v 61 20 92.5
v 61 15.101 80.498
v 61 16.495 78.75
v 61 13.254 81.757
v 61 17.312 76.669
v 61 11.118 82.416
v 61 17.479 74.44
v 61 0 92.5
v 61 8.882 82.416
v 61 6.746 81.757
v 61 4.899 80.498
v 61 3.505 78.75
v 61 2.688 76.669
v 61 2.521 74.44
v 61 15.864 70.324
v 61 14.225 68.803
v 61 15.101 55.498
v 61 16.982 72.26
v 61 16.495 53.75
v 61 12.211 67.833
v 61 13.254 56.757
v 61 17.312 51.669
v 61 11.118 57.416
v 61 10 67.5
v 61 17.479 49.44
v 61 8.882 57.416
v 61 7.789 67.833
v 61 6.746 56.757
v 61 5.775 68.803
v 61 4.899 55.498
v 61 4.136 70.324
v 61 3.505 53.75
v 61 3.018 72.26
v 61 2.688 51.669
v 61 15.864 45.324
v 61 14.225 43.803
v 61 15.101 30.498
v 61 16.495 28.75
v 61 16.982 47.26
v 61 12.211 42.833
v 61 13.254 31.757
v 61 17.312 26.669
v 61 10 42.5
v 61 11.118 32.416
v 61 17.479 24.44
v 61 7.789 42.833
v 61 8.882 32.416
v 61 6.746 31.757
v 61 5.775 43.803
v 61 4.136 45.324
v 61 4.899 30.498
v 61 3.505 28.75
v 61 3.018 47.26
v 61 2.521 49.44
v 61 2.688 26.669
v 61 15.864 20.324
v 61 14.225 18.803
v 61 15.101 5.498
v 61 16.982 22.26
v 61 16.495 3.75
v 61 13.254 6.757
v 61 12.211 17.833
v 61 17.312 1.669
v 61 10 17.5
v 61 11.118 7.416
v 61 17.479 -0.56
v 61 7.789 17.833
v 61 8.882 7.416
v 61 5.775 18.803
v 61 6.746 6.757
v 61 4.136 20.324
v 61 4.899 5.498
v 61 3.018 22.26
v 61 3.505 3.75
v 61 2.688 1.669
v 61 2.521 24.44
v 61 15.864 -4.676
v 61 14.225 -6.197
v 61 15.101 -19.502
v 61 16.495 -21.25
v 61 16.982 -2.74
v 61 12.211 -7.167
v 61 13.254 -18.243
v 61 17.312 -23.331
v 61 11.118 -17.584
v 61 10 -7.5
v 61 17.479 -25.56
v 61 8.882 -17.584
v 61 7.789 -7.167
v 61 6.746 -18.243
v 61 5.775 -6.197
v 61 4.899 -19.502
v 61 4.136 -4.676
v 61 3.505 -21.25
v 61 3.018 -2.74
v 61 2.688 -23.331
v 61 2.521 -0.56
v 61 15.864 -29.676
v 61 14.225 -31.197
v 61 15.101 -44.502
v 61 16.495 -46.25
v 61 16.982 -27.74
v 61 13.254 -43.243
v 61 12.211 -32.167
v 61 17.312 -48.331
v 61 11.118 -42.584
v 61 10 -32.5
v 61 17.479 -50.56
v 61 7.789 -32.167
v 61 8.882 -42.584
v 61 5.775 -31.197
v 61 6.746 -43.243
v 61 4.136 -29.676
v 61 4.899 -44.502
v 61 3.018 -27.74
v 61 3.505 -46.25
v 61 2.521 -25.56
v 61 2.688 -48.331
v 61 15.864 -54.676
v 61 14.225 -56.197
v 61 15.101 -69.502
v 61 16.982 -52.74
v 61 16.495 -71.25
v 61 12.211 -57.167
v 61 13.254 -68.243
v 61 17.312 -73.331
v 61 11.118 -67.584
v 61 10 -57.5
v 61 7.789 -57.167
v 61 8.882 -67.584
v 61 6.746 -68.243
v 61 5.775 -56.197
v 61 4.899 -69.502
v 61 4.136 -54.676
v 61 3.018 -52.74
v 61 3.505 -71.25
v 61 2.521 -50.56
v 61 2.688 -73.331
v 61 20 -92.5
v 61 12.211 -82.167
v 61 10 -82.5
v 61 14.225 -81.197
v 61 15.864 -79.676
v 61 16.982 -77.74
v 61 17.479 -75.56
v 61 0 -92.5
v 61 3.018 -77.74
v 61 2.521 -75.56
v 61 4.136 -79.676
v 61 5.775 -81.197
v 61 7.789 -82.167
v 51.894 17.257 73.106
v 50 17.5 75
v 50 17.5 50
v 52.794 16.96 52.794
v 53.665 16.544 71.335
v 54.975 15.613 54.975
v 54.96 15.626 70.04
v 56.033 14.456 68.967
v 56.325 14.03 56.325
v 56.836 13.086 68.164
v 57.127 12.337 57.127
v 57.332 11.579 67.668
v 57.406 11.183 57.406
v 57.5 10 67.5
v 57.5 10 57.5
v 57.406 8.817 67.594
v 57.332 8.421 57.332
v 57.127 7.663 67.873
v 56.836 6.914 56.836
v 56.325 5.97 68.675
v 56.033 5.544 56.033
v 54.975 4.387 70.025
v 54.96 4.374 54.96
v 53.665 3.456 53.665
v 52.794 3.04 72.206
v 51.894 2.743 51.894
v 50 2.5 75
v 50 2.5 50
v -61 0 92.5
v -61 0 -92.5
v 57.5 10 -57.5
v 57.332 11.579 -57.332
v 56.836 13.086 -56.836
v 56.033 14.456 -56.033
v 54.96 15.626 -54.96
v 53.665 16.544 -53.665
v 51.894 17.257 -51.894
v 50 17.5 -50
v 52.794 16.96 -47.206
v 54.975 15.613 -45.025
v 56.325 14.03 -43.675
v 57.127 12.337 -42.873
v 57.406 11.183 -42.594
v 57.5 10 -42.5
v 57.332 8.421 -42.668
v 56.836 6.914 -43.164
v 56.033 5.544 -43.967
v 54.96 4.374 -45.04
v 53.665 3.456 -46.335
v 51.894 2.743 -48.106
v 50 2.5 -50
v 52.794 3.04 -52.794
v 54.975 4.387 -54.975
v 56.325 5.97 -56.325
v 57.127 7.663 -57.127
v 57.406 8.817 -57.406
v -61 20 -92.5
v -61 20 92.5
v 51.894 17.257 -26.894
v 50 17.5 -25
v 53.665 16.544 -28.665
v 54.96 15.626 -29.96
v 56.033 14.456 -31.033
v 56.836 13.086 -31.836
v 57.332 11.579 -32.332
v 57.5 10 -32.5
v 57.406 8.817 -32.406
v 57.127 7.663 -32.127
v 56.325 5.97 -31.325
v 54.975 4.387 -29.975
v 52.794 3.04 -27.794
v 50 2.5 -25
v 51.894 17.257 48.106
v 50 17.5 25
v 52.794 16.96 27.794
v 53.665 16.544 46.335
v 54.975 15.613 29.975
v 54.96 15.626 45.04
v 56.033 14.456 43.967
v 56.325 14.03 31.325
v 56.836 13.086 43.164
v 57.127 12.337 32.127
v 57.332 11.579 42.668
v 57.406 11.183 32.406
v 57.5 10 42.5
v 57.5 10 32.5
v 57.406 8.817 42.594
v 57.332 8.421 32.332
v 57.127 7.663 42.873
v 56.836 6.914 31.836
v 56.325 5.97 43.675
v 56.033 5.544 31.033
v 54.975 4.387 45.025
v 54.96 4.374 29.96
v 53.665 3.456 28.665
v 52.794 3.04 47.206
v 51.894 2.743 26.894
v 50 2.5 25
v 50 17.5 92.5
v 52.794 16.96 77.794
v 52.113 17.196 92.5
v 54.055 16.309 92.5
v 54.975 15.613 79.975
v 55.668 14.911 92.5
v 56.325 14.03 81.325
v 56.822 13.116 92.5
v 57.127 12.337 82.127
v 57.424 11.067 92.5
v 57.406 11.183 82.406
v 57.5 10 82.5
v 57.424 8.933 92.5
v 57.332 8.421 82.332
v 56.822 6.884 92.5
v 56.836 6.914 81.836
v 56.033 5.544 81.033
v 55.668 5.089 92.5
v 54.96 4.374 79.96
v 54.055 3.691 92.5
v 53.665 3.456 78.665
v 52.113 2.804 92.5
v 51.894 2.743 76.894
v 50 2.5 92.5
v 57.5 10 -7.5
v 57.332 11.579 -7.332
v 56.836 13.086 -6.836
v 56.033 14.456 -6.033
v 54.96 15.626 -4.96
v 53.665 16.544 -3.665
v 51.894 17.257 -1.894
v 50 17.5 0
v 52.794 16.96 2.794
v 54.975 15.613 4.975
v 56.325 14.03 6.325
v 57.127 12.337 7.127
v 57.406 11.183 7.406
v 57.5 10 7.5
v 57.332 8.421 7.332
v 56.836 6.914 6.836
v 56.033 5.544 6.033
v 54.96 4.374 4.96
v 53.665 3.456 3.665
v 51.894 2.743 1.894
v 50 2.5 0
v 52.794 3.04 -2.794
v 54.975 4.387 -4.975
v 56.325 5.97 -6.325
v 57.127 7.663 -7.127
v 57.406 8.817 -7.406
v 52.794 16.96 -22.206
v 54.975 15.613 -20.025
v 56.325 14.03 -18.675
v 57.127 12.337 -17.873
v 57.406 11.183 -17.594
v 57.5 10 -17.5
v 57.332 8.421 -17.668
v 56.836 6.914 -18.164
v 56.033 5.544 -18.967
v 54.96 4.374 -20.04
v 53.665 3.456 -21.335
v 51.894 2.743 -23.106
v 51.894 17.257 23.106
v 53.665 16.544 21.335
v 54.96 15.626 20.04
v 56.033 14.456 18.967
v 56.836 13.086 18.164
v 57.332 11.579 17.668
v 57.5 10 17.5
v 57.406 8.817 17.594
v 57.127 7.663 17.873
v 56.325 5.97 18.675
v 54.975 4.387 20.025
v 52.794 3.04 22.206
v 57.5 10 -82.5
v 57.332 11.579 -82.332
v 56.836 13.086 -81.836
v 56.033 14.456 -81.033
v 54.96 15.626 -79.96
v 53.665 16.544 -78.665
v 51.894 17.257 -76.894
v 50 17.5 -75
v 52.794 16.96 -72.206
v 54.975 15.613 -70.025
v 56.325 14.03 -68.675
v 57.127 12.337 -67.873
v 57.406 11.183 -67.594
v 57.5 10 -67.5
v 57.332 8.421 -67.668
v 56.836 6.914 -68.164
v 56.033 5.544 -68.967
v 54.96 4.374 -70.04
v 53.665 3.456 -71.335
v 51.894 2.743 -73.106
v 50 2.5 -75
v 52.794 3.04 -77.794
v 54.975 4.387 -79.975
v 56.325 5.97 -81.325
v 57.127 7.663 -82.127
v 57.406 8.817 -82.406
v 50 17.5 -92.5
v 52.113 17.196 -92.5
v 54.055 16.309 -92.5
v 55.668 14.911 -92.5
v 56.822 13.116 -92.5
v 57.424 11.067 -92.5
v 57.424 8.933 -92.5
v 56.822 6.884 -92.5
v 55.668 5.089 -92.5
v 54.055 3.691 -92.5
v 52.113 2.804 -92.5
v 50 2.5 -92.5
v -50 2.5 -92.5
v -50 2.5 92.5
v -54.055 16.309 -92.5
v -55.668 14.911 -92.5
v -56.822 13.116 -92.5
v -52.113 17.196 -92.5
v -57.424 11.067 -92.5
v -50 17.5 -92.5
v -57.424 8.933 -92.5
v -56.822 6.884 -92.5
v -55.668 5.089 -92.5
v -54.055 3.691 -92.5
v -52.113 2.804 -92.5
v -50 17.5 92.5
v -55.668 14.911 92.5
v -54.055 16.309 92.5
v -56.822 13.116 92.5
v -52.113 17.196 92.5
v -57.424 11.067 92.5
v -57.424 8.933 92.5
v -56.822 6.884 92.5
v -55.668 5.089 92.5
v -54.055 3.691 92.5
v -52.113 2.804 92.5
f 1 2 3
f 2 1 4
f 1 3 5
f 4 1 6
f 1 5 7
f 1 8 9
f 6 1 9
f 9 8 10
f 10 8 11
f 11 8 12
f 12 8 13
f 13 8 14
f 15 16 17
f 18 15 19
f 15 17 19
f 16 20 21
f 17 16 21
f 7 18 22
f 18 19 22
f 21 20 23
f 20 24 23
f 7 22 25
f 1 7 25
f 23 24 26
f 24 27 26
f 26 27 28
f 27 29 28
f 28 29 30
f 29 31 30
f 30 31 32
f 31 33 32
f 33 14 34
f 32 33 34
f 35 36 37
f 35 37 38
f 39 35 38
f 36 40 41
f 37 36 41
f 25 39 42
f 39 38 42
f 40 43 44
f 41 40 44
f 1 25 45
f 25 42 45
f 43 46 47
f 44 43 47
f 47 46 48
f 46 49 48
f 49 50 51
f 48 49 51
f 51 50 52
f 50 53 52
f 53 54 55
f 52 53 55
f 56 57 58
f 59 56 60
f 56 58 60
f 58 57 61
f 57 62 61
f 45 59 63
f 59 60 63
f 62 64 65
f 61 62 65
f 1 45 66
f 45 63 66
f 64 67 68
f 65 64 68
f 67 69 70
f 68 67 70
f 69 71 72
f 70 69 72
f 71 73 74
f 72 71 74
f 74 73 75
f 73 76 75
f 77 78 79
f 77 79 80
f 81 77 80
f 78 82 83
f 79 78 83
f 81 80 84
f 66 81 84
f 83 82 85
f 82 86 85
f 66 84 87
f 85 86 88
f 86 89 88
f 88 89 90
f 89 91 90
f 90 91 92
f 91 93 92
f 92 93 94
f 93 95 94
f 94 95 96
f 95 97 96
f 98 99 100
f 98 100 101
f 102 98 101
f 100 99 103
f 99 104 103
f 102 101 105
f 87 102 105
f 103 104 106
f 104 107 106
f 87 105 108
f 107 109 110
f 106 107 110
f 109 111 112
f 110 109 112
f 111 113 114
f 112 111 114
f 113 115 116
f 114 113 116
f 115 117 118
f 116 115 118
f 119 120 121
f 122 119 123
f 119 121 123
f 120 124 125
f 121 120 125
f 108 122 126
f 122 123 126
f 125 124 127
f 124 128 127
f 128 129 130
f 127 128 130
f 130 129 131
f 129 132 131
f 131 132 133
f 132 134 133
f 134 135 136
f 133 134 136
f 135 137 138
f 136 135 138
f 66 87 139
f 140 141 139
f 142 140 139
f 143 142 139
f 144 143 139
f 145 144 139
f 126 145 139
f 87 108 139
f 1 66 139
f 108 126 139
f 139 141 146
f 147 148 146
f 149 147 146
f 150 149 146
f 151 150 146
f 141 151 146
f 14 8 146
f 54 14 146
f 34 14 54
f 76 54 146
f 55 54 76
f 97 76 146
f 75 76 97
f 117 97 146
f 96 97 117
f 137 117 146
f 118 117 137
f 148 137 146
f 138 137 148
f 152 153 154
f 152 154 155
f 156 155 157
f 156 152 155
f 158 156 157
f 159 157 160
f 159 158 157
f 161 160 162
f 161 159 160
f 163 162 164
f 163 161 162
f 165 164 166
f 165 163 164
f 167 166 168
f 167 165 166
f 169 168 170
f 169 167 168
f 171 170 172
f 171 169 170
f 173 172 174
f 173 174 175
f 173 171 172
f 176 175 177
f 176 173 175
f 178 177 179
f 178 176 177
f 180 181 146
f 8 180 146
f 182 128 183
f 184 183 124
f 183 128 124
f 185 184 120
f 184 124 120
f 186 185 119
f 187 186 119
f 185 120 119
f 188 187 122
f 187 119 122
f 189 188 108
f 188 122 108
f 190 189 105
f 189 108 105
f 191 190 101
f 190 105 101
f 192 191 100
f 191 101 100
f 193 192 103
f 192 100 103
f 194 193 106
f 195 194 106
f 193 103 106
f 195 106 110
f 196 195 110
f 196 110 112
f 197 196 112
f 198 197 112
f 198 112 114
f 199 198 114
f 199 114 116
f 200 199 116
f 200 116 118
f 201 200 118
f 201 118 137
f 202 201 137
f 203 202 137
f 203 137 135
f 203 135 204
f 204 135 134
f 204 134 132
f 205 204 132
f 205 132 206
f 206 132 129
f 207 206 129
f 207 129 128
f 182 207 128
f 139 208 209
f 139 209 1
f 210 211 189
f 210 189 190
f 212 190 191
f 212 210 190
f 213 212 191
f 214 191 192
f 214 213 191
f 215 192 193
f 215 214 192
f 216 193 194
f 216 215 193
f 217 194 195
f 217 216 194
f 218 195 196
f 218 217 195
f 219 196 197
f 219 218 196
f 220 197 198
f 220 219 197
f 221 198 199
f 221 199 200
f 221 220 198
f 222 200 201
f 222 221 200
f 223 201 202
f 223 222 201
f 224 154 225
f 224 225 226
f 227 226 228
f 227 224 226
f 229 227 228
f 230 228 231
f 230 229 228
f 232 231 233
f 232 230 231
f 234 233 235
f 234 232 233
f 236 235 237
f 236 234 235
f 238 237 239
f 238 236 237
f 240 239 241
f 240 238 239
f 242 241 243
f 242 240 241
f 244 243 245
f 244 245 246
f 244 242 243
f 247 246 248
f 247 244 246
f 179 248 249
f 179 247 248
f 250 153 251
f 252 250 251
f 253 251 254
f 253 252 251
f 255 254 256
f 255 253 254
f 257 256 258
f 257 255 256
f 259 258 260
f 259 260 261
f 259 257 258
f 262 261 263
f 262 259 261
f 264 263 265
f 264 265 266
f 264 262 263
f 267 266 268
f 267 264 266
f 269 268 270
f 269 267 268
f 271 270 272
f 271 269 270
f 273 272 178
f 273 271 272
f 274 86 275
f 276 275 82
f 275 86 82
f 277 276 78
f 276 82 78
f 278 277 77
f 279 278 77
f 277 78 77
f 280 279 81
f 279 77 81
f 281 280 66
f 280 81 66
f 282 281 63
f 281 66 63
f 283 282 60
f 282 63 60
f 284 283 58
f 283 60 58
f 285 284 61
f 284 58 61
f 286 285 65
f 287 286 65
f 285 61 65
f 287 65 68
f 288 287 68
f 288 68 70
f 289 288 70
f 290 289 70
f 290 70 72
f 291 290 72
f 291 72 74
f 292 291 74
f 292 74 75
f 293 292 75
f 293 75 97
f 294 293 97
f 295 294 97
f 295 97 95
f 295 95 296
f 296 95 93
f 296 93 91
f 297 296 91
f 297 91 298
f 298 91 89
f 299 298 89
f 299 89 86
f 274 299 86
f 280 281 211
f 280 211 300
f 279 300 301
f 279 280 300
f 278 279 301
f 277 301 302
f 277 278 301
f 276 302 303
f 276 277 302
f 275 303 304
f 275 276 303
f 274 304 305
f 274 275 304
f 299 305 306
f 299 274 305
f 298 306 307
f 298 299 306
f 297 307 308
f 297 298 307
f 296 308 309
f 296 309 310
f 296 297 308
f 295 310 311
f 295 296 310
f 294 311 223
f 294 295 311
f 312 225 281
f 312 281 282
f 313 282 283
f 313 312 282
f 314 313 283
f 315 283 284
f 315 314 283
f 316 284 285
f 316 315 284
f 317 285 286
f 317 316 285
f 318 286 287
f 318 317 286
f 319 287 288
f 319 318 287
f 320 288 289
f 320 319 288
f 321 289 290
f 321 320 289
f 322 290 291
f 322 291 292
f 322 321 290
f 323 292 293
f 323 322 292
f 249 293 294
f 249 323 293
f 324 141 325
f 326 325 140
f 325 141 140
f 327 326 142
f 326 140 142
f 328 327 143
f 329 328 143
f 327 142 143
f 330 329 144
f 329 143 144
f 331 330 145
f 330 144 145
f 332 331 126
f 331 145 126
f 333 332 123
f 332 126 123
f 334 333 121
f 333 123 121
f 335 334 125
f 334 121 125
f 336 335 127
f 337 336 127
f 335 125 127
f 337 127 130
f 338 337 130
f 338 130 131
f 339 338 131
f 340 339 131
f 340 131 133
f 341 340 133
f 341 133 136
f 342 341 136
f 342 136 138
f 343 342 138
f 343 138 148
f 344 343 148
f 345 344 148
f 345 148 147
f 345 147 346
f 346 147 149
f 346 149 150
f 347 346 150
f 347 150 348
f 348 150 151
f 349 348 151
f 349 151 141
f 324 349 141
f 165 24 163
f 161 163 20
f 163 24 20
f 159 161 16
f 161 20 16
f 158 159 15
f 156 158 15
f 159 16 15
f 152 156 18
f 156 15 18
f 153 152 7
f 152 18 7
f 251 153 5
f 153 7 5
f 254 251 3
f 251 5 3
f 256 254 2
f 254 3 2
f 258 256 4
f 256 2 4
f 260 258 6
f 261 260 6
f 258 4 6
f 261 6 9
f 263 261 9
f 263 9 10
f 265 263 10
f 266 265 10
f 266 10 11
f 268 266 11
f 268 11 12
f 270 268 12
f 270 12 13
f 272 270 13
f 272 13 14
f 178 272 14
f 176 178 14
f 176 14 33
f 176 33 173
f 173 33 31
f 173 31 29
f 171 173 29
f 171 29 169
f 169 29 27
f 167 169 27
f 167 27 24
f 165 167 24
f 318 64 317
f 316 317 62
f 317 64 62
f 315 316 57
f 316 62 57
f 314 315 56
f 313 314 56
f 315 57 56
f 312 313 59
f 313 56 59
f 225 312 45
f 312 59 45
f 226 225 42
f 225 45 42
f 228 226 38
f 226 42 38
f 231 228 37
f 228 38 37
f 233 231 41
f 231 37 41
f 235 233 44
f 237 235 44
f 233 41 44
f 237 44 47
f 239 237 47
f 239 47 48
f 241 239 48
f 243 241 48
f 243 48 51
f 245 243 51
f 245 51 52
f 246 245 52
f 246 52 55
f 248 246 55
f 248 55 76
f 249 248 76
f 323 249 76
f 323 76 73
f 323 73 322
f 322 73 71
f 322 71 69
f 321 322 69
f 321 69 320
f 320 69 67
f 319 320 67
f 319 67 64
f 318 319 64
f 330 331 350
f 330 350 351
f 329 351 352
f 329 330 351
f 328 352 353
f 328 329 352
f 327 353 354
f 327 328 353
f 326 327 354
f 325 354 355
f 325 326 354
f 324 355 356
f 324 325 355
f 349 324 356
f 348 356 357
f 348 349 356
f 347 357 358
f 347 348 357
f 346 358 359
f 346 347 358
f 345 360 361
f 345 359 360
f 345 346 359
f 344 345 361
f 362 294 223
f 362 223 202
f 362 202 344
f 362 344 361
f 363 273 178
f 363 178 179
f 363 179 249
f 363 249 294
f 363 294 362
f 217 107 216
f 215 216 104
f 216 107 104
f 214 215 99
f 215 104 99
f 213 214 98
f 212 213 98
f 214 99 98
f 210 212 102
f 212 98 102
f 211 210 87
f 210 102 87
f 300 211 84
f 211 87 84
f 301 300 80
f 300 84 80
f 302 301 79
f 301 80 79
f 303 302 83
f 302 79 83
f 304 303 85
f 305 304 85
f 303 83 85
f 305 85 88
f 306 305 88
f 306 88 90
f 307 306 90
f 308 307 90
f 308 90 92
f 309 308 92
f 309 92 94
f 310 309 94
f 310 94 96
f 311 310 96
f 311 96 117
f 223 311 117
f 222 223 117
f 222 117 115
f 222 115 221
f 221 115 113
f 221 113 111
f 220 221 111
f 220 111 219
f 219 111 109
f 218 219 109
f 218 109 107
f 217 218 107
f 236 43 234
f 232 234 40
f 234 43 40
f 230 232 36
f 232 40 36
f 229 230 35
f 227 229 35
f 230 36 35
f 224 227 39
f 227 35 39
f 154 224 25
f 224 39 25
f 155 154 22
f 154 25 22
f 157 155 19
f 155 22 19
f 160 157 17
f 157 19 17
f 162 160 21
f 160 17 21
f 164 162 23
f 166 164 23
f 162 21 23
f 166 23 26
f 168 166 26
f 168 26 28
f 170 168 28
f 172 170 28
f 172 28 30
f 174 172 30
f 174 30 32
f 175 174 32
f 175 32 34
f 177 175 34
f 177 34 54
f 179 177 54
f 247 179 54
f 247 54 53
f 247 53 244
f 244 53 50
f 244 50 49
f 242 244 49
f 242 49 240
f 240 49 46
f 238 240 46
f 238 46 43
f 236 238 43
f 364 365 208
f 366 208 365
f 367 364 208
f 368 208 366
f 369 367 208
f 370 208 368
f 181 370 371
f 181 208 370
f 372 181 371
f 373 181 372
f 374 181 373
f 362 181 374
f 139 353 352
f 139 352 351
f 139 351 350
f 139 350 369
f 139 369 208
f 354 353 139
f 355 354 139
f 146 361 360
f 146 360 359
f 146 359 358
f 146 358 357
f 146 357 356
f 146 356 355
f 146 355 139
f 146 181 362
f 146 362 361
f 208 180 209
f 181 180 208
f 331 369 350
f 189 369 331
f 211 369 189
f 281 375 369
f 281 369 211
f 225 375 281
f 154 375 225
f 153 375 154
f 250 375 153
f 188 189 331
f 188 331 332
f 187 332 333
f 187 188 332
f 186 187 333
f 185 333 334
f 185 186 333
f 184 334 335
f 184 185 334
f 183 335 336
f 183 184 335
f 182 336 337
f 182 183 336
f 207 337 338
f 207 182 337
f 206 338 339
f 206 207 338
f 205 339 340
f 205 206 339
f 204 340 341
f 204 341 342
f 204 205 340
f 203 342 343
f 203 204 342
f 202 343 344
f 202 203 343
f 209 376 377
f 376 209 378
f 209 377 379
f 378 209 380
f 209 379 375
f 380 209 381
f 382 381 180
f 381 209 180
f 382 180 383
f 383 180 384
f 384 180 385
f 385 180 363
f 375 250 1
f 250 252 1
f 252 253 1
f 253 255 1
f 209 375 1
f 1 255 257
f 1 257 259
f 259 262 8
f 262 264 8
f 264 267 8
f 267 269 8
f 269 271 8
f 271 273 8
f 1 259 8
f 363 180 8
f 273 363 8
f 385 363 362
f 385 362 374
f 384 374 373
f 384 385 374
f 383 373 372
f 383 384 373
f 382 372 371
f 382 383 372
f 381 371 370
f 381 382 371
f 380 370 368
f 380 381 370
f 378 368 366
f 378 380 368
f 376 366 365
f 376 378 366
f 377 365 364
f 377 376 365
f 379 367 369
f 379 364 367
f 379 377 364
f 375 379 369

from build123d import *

# Parameters (mm, degrees)
SKETCH1_W               = 122
SKETCH1_H               = 185
BOSS_EXTRUDE1_DEPTH     = 20
CUT_EXTRUDE1_DEPTH      = 196.821347151
CUT_EXTRUDE2_REACH      = 156.403
CUT_EXTRUDE2_END_RADIUS = 7.5
SKETCH2_R               = 7.5


with BuildPart() as part:
    # Sketch1 → Boss-Extrude1 (new body)
    with BuildSketch(Plane(origin=(0, 0, 0), x_dir=(1, 0, 0), z_dir=(0, 1, 0))):
        Rectangle(SKETCH1_W, SKETCH1_H)
    extrude(amount=BOSS_EXTRUDE1_DEPTH)

    # Sketch3 → Cut-Extrude1 (cut, through all)
    with BuildSketch(Plane.XY.offset(92.5)):
        with BuildLine():
            Line((-50, 17.5), (50, 17.5))
            ThreePointArc((50, 17.5), (57.5, 10), (50, 2.5))
            Line((50, 2.5), (-50, 2.5))
            ThreePointArc((-50, 2.5), (-57.5, 10), (-50, 17.5))
        make_face()
    extrude(amount=-CUT_EXTRUDE1_DEPTH, mode=Mode.SUBTRACT)

    # Cut-Extrude2: up to this cylinder (the profile starts outside it)
    cut_extrude2_end = Plane(origin=(50, 10, 0), z_dir=(0, 0, 1)) * Cylinder(CUT_EXTRUDE2_END_RADIUS, 478.806, mode=Mode.PRIVATE)
    # Sketch2 → Cut-Extrude2 (cut, up to the surface)
    with BuildSketch(Plane(origin=(61, 0, 0), x_dir=(0, 0, -1), z_dir=(1, 0, 0)), mode=Mode.PRIVATE) as cut_extrude2_sk1:
        with Locations((-75, 10)):
            Circle(SKETCH2_R)
    cut_extrude2_tool1 = extrude(cut_extrude2_sk1.sketch, amount=-CUT_EXTRUDE2_REACH, mode=Mode.PRIVATE) - cut_extrude2_end
    add(cut_extrude2_tool1.solids().sort_by_distance((61, 10, 75))[0], mode=Mode.SUBTRACT)
    # Sketch2 → Cut-Extrude2 (cut, up to the surface)
    with BuildSketch(Plane(origin=(61, 0, 0), x_dir=(0, 0, -1), z_dir=(1, 0, 0)), mode=Mode.PRIVATE) as cut_extrude2_sk2:
        with Locations((-50, 10)):
            Circle(SKETCH2_R)
    cut_extrude2_tool2 = extrude(cut_extrude2_sk2.sketch, amount=-CUT_EXTRUDE2_REACH, mode=Mode.PRIVATE) - cut_extrude2_end
    add(cut_extrude2_tool2.solids().sort_by_distance((61, 10, 50))[0], mode=Mode.SUBTRACT)
    # Sketch2 → Cut-Extrude2 (cut, up to the surface)
    with BuildSketch(Plane(origin=(61, 0, 0), x_dir=(0, 0, -1), z_dir=(1, 0, 0)), mode=Mode.PRIVATE) as cut_extrude2_sk3:
        with Locations((-25, 10)):
            Circle(SKETCH2_R)
    cut_extrude2_tool3 = extrude(cut_extrude2_sk3.sketch, amount=-CUT_EXTRUDE2_REACH, mode=Mode.PRIVATE) - cut_extrude2_end
    add(cut_extrude2_tool3.solids().sort_by_distance((61, 10, 25))[0], mode=Mode.SUBTRACT)
    # Sketch2 → Cut-Extrude2 (cut, up to the surface)
    with BuildSketch(Plane(origin=(61, 0, 0), x_dir=(0, 0, -1), z_dir=(1, 0, 0)), mode=Mode.PRIVATE) as cut_extrude2_sk4:
        with Locations((0, 10)):
            Circle(SKETCH2_R)
    cut_extrude2_tool4 = extrude(cut_extrude2_sk4.sketch, amount=-CUT_EXTRUDE2_REACH, mode=Mode.PRIVATE) - cut_extrude2_end
    add(cut_extrude2_tool4.solids().sort_by_distance((61, 10, 0))[0], mode=Mode.SUBTRACT)
    # Sketch2 → Cut-Extrude2 (cut, up to the surface)
    with BuildSketch(Plane(origin=(61, 0, 0), x_dir=(0, 0, -1), z_dir=(1, 0, 0)), mode=Mode.PRIVATE) as cut_extrude2_sk5:
        with Locations((25, 10)):
            Circle(SKETCH2_R)
    cut_extrude2_tool5 = extrude(cut_extrude2_sk5.sketch, amount=-CUT_EXTRUDE2_REACH, mode=Mode.PRIVATE) - cut_extrude2_end
    add(cut_extrude2_tool5.solids().sort_by_distance((61, 10, -25))[0], mode=Mode.SUBTRACT)
    # Sketch2 → Cut-Extrude2 (cut, up to the surface)
    with BuildSketch(Plane(origin=(61, 0, 0), x_dir=(0, 0, -1), z_dir=(1, 0, 0)), mode=Mode.PRIVATE) as cut_extrude2_sk6:
        with Locations((50, 10)):
            Circle(SKETCH2_R)
    cut_extrude2_tool6 = extrude(cut_extrude2_sk6.sketch, amount=-CUT_EXTRUDE2_REACH, mode=Mode.PRIVATE) - cut_extrude2_end
    add(cut_extrude2_tool6.solids().sort_by_distance((61, 10, -50))[0], mode=Mode.SUBTRACT)
    # Sketch2 → Cut-Extrude2 (cut, up to the surface)
    with BuildSketch(Plane(origin=(61, 0, 0), x_dir=(0, 0, -1), z_dir=(1, 0, 0)), mode=Mode.PRIVATE) as cut_extrude2_sk7:
        with Locations((75, 10)):
            Circle(SKETCH2_R)
    cut_extrude2_tool7 = extrude(cut_extrude2_sk7.sketch, amount=-CUT_EXTRUDE2_REACH, mode=Mode.PRIVATE) - cut_extrude2_end
    add(cut_extrude2_tool7.solids().sort_by_distance((61, 10, -75))[0], mode=Mode.SUBTRACT)


solid = part.part
